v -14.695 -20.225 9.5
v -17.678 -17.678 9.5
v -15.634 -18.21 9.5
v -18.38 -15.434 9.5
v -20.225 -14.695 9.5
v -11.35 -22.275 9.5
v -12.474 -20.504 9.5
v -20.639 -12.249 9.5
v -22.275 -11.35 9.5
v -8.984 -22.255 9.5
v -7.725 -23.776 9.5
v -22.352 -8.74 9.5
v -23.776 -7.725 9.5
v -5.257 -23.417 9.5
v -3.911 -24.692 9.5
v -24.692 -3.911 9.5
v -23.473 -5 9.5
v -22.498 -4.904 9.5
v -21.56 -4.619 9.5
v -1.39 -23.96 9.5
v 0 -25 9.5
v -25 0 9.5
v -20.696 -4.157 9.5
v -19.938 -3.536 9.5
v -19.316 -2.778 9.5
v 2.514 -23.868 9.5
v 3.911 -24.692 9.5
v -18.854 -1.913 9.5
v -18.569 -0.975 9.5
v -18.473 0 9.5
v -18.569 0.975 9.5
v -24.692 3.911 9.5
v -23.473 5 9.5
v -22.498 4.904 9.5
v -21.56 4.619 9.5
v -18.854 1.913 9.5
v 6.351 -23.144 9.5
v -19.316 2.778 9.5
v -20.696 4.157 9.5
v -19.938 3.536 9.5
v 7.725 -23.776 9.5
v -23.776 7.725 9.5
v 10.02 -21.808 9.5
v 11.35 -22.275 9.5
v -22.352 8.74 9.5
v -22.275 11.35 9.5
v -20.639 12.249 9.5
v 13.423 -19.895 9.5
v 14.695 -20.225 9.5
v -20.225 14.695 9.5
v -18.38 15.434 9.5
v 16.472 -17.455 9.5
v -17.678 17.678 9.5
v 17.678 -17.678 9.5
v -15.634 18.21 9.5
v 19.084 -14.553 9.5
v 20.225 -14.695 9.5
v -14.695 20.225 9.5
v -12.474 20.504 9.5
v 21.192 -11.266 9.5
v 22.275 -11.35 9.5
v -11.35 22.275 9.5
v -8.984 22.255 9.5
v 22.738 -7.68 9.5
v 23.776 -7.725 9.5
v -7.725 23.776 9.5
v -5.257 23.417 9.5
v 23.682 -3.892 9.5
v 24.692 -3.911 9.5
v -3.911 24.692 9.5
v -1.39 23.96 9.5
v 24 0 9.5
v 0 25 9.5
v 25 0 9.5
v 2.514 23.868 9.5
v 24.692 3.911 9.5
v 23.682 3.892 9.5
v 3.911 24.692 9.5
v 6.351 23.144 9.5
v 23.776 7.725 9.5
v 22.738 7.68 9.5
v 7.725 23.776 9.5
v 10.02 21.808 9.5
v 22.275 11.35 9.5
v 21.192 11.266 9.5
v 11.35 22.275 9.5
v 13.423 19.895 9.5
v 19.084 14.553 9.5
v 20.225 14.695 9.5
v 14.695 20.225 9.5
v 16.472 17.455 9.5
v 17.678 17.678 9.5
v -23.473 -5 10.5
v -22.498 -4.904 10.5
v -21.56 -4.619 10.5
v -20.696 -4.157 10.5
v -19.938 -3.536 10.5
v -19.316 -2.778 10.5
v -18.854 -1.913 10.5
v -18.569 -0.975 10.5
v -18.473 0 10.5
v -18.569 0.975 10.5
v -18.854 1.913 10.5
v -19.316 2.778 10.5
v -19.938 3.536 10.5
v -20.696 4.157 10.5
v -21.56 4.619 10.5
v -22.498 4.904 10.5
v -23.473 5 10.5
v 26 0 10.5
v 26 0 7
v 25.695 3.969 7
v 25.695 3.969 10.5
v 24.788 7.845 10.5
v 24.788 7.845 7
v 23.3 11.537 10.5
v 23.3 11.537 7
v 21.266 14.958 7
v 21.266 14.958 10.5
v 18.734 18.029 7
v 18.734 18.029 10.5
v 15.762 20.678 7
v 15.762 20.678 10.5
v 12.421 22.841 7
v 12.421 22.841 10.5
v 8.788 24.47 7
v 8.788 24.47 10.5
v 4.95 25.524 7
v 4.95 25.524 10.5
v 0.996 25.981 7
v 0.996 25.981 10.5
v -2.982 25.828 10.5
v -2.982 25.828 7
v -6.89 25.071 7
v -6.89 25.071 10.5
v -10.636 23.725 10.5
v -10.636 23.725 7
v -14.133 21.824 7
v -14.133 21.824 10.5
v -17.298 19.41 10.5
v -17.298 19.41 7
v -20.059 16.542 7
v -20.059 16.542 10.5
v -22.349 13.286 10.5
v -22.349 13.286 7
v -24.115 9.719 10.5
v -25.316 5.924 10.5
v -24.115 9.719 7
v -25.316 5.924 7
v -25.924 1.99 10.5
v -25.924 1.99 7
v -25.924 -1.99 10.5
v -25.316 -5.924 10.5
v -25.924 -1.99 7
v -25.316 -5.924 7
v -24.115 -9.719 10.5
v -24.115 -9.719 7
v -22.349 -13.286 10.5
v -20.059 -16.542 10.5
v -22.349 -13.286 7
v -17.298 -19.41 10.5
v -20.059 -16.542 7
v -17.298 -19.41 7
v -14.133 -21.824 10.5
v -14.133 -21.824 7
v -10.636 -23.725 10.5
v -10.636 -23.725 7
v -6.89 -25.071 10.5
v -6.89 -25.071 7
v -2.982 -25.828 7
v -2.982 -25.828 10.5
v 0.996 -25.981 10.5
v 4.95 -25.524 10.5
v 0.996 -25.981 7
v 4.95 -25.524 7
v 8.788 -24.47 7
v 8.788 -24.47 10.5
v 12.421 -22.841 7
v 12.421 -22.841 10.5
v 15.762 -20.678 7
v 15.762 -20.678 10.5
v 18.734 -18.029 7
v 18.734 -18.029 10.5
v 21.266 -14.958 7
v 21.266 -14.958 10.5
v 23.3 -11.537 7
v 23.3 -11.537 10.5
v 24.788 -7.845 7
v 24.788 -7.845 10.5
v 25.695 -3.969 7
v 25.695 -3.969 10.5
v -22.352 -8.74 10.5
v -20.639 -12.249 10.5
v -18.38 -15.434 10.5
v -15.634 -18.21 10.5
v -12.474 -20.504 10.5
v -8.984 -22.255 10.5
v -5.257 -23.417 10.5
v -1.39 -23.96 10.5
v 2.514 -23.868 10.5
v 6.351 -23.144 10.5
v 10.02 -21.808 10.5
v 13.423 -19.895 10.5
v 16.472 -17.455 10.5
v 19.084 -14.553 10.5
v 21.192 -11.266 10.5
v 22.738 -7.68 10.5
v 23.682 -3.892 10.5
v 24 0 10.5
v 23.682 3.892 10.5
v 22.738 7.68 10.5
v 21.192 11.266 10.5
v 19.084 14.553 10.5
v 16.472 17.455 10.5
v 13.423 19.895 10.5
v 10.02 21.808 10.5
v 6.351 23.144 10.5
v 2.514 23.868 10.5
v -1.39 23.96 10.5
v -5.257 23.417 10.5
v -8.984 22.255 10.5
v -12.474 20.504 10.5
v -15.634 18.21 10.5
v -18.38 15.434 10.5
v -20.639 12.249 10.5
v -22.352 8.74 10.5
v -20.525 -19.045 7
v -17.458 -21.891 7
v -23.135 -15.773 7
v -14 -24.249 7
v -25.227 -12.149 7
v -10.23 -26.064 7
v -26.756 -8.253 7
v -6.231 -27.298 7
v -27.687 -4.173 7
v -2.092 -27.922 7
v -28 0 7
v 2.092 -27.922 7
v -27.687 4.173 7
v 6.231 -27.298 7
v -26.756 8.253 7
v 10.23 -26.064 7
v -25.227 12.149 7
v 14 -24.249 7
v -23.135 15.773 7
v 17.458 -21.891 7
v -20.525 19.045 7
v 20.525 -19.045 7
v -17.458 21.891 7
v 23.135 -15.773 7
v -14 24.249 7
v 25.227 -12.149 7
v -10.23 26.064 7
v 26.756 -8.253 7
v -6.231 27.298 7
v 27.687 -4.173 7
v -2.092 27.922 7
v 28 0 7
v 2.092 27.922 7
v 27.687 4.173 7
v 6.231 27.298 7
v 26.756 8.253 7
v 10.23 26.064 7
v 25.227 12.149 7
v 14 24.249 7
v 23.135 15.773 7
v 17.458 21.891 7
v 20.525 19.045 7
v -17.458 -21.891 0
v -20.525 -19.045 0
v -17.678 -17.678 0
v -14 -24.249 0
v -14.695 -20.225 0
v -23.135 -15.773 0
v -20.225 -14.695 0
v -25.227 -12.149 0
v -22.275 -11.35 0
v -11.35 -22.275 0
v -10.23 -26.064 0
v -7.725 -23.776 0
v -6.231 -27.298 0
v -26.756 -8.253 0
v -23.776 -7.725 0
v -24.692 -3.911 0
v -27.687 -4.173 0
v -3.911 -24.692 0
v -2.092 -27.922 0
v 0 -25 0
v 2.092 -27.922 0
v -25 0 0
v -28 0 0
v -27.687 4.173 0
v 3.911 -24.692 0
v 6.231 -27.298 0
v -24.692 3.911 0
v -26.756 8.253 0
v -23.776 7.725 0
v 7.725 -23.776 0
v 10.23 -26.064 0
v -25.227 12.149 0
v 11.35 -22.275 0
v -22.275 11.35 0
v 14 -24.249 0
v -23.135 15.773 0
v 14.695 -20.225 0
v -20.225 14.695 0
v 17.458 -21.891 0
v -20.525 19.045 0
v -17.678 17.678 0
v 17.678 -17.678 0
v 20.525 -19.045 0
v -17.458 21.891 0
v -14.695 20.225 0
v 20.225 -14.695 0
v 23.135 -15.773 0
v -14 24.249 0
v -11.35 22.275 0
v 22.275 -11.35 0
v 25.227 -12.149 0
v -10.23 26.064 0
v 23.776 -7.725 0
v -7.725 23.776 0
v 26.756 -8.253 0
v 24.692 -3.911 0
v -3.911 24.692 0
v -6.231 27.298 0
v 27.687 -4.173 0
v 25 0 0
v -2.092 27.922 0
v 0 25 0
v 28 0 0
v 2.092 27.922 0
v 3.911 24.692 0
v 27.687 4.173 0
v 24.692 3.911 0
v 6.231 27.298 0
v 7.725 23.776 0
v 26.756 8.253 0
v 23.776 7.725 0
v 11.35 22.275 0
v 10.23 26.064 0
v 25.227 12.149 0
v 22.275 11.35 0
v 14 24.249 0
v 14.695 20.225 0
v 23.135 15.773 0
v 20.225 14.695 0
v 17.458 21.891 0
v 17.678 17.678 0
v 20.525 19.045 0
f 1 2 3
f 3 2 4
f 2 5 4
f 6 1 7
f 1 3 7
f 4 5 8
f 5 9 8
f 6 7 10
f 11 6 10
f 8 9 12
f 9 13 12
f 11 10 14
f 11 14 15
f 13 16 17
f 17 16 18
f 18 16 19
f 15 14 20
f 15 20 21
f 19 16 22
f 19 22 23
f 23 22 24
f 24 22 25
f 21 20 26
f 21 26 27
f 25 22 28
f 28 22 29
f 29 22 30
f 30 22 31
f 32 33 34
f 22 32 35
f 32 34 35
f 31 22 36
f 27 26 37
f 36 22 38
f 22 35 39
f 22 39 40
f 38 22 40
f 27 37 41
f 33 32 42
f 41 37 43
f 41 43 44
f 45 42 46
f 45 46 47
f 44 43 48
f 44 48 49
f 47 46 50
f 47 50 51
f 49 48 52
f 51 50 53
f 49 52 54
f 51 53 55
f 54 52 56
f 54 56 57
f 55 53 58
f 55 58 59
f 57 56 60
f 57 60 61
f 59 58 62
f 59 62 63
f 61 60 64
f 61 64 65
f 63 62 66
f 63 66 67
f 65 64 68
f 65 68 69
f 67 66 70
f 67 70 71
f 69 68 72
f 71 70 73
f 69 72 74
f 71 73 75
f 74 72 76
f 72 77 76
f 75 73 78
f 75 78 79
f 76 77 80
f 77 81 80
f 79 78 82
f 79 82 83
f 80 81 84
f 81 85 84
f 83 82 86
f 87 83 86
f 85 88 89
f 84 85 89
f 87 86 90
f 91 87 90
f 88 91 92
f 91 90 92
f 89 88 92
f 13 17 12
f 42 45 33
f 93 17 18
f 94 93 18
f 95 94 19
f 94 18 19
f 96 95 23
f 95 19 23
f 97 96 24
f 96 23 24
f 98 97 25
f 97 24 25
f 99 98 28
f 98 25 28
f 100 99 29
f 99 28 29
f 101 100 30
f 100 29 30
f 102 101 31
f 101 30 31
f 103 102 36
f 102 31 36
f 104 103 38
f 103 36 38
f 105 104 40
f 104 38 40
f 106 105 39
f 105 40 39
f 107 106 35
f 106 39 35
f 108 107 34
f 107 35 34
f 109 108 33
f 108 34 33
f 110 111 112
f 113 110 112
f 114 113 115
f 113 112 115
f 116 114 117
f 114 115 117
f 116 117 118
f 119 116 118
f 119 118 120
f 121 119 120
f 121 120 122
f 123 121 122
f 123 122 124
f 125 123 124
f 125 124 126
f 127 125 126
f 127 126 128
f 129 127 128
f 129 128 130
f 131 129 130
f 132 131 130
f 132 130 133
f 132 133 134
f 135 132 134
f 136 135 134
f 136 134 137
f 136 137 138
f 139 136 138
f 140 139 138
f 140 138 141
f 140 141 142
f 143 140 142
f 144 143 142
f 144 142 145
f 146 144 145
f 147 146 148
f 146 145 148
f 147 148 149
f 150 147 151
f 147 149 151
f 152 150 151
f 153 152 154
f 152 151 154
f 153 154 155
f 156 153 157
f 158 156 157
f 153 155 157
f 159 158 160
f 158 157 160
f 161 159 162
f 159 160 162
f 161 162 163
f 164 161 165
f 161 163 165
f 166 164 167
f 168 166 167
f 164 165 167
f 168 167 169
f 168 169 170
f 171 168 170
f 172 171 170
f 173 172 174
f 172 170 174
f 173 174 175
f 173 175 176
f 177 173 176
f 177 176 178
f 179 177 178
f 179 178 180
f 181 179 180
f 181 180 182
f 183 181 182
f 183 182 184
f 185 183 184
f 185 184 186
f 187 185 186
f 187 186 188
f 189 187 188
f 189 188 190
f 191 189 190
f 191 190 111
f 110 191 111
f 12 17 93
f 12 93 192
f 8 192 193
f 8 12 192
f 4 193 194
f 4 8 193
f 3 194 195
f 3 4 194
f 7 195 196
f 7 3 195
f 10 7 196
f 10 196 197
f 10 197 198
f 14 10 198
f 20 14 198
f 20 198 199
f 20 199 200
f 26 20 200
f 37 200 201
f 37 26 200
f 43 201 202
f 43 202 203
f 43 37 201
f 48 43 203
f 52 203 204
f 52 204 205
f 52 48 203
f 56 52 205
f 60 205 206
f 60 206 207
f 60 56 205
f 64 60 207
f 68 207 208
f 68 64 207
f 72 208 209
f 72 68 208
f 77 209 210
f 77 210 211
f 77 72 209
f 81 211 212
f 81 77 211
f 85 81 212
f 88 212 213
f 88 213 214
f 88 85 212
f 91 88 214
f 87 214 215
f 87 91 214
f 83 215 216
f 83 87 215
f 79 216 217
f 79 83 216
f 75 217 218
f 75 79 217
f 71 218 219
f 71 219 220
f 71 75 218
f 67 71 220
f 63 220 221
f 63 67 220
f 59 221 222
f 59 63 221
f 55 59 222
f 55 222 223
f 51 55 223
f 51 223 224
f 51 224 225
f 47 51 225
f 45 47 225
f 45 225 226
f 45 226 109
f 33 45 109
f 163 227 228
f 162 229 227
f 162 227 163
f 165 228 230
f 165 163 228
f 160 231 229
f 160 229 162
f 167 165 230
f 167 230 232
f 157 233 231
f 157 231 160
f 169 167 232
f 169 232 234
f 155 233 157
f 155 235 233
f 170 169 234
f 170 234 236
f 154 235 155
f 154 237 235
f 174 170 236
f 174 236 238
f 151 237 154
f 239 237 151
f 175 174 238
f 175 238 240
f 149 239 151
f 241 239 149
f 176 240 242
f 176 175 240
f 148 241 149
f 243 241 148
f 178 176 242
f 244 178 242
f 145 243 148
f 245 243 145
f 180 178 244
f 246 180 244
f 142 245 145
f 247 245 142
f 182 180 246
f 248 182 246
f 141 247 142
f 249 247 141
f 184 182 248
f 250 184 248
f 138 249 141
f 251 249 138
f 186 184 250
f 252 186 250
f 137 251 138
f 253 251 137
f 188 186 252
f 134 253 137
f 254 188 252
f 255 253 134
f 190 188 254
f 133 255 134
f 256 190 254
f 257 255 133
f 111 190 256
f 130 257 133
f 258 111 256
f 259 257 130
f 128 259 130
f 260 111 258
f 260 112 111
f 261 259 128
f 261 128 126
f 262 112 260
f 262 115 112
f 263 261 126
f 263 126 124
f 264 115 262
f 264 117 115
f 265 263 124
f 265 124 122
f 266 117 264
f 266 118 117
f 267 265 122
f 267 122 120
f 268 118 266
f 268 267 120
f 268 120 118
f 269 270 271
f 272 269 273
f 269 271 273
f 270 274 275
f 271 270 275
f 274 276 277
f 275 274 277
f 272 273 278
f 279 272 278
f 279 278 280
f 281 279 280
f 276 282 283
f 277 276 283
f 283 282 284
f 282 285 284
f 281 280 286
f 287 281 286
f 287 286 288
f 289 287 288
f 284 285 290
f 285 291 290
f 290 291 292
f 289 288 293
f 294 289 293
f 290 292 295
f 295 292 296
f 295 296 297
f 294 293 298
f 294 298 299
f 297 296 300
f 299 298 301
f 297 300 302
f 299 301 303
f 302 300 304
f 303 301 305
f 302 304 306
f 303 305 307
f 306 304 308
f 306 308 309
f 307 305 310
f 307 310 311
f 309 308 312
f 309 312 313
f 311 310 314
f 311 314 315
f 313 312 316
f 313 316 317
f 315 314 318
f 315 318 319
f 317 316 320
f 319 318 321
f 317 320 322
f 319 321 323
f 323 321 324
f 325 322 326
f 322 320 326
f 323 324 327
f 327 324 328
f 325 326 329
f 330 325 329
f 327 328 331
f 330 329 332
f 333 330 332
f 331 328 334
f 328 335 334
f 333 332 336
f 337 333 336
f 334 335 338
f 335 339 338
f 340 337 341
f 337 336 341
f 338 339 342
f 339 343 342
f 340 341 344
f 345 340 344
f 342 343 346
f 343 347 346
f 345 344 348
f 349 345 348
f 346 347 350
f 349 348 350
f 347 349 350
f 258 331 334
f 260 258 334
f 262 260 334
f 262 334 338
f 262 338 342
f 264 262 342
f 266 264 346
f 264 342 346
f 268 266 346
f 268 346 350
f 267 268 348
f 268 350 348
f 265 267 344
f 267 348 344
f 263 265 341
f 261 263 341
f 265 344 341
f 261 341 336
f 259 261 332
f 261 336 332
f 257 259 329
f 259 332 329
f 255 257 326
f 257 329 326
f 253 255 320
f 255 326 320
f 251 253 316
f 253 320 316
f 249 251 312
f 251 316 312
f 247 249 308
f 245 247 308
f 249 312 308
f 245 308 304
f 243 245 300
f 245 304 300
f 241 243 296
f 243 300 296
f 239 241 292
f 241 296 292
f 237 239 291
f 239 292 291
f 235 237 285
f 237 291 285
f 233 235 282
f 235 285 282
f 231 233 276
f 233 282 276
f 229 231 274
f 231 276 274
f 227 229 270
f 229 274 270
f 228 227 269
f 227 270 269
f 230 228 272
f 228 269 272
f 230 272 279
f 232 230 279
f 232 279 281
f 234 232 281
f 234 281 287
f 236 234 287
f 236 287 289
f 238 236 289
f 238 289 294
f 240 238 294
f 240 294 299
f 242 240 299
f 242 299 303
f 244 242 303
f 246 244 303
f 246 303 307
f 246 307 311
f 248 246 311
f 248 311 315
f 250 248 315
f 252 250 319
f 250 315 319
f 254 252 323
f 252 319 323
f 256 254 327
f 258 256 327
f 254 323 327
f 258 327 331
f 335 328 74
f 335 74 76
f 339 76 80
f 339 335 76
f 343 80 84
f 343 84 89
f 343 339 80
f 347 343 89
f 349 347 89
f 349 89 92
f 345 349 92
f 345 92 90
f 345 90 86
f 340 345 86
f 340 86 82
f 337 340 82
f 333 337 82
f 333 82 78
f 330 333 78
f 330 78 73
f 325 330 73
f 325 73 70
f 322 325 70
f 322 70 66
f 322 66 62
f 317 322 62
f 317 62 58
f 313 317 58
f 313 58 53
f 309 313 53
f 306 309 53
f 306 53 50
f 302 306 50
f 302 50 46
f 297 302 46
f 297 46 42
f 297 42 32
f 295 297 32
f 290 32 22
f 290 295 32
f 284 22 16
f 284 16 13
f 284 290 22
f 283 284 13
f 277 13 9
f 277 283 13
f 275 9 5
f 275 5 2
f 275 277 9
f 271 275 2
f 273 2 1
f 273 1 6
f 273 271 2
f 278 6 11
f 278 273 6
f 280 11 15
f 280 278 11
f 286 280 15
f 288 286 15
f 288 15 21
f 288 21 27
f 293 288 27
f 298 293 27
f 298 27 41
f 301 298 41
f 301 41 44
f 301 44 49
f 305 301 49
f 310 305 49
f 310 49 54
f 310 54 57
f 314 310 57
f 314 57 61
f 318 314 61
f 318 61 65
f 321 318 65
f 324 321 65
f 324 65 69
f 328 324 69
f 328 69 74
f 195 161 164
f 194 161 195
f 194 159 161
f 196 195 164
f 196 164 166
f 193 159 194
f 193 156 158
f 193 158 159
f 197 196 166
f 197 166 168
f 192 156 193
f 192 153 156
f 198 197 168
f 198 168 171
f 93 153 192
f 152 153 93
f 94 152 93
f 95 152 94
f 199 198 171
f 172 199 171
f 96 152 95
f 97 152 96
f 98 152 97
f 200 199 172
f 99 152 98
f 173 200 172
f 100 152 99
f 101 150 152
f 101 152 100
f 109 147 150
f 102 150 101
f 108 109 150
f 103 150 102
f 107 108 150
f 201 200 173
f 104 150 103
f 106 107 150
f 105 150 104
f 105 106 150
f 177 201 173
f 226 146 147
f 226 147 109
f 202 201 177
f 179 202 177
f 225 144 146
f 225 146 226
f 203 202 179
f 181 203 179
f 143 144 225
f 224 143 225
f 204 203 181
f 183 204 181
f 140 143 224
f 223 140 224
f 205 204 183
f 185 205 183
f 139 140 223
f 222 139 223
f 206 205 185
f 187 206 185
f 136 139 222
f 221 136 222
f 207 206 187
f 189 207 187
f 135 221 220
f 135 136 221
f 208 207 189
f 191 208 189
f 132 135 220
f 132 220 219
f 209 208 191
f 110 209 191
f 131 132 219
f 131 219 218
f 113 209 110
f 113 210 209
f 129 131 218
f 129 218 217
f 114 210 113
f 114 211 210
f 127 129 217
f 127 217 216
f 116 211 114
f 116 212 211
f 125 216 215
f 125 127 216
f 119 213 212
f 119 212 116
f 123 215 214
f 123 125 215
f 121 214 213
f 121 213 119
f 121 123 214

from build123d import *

# Parameters (mm, degrees)
SKETCH_R      = 28
SKETCH_R_2    = 25
PAD_DEPTH     = 7
SKETCH001_R   = 26
SKETCH001_R_2 = 25
PAD001_DEPTH  = 10.5
SKETCH002_R   = 25
PAD002_DEPTH  = 1


with BuildPart() as part:
    # Sketch → Pad (new body)
    with BuildSketch(Plane.XY):
        Circle(SKETCH_R)
        Circle(SKETCH_R_2, mode=Mode.SUBTRACT)
    extrude(amount=PAD_DEPTH)

    # Sketch001 → Pad001 (join)
    with BuildSketch(Plane.XY):
        Circle(SKETCH001_R)
        Circle(SKETCH001_R_2, mode=Mode.SUBTRACT)
    extrude(amount=PAD001_DEPTH)

    # Sketch002 (on DatumPlane) → Pad002 (join)
    with BuildSketch(Plane.XY.offset(9.5)):
        Circle(SKETCH002_R)
        with BuildLine():
            ThreePointArc((-23.473389, -5), (24, 0), (-23.473389, 5))
            ThreePointArc((-23.473389, -5), (-18.473389, 0), (-23.473389, 5))
        make_face(mode=Mode.SUBTRACT)
    extrude(amount=PAD002_DEPTH)


solid = part.part
